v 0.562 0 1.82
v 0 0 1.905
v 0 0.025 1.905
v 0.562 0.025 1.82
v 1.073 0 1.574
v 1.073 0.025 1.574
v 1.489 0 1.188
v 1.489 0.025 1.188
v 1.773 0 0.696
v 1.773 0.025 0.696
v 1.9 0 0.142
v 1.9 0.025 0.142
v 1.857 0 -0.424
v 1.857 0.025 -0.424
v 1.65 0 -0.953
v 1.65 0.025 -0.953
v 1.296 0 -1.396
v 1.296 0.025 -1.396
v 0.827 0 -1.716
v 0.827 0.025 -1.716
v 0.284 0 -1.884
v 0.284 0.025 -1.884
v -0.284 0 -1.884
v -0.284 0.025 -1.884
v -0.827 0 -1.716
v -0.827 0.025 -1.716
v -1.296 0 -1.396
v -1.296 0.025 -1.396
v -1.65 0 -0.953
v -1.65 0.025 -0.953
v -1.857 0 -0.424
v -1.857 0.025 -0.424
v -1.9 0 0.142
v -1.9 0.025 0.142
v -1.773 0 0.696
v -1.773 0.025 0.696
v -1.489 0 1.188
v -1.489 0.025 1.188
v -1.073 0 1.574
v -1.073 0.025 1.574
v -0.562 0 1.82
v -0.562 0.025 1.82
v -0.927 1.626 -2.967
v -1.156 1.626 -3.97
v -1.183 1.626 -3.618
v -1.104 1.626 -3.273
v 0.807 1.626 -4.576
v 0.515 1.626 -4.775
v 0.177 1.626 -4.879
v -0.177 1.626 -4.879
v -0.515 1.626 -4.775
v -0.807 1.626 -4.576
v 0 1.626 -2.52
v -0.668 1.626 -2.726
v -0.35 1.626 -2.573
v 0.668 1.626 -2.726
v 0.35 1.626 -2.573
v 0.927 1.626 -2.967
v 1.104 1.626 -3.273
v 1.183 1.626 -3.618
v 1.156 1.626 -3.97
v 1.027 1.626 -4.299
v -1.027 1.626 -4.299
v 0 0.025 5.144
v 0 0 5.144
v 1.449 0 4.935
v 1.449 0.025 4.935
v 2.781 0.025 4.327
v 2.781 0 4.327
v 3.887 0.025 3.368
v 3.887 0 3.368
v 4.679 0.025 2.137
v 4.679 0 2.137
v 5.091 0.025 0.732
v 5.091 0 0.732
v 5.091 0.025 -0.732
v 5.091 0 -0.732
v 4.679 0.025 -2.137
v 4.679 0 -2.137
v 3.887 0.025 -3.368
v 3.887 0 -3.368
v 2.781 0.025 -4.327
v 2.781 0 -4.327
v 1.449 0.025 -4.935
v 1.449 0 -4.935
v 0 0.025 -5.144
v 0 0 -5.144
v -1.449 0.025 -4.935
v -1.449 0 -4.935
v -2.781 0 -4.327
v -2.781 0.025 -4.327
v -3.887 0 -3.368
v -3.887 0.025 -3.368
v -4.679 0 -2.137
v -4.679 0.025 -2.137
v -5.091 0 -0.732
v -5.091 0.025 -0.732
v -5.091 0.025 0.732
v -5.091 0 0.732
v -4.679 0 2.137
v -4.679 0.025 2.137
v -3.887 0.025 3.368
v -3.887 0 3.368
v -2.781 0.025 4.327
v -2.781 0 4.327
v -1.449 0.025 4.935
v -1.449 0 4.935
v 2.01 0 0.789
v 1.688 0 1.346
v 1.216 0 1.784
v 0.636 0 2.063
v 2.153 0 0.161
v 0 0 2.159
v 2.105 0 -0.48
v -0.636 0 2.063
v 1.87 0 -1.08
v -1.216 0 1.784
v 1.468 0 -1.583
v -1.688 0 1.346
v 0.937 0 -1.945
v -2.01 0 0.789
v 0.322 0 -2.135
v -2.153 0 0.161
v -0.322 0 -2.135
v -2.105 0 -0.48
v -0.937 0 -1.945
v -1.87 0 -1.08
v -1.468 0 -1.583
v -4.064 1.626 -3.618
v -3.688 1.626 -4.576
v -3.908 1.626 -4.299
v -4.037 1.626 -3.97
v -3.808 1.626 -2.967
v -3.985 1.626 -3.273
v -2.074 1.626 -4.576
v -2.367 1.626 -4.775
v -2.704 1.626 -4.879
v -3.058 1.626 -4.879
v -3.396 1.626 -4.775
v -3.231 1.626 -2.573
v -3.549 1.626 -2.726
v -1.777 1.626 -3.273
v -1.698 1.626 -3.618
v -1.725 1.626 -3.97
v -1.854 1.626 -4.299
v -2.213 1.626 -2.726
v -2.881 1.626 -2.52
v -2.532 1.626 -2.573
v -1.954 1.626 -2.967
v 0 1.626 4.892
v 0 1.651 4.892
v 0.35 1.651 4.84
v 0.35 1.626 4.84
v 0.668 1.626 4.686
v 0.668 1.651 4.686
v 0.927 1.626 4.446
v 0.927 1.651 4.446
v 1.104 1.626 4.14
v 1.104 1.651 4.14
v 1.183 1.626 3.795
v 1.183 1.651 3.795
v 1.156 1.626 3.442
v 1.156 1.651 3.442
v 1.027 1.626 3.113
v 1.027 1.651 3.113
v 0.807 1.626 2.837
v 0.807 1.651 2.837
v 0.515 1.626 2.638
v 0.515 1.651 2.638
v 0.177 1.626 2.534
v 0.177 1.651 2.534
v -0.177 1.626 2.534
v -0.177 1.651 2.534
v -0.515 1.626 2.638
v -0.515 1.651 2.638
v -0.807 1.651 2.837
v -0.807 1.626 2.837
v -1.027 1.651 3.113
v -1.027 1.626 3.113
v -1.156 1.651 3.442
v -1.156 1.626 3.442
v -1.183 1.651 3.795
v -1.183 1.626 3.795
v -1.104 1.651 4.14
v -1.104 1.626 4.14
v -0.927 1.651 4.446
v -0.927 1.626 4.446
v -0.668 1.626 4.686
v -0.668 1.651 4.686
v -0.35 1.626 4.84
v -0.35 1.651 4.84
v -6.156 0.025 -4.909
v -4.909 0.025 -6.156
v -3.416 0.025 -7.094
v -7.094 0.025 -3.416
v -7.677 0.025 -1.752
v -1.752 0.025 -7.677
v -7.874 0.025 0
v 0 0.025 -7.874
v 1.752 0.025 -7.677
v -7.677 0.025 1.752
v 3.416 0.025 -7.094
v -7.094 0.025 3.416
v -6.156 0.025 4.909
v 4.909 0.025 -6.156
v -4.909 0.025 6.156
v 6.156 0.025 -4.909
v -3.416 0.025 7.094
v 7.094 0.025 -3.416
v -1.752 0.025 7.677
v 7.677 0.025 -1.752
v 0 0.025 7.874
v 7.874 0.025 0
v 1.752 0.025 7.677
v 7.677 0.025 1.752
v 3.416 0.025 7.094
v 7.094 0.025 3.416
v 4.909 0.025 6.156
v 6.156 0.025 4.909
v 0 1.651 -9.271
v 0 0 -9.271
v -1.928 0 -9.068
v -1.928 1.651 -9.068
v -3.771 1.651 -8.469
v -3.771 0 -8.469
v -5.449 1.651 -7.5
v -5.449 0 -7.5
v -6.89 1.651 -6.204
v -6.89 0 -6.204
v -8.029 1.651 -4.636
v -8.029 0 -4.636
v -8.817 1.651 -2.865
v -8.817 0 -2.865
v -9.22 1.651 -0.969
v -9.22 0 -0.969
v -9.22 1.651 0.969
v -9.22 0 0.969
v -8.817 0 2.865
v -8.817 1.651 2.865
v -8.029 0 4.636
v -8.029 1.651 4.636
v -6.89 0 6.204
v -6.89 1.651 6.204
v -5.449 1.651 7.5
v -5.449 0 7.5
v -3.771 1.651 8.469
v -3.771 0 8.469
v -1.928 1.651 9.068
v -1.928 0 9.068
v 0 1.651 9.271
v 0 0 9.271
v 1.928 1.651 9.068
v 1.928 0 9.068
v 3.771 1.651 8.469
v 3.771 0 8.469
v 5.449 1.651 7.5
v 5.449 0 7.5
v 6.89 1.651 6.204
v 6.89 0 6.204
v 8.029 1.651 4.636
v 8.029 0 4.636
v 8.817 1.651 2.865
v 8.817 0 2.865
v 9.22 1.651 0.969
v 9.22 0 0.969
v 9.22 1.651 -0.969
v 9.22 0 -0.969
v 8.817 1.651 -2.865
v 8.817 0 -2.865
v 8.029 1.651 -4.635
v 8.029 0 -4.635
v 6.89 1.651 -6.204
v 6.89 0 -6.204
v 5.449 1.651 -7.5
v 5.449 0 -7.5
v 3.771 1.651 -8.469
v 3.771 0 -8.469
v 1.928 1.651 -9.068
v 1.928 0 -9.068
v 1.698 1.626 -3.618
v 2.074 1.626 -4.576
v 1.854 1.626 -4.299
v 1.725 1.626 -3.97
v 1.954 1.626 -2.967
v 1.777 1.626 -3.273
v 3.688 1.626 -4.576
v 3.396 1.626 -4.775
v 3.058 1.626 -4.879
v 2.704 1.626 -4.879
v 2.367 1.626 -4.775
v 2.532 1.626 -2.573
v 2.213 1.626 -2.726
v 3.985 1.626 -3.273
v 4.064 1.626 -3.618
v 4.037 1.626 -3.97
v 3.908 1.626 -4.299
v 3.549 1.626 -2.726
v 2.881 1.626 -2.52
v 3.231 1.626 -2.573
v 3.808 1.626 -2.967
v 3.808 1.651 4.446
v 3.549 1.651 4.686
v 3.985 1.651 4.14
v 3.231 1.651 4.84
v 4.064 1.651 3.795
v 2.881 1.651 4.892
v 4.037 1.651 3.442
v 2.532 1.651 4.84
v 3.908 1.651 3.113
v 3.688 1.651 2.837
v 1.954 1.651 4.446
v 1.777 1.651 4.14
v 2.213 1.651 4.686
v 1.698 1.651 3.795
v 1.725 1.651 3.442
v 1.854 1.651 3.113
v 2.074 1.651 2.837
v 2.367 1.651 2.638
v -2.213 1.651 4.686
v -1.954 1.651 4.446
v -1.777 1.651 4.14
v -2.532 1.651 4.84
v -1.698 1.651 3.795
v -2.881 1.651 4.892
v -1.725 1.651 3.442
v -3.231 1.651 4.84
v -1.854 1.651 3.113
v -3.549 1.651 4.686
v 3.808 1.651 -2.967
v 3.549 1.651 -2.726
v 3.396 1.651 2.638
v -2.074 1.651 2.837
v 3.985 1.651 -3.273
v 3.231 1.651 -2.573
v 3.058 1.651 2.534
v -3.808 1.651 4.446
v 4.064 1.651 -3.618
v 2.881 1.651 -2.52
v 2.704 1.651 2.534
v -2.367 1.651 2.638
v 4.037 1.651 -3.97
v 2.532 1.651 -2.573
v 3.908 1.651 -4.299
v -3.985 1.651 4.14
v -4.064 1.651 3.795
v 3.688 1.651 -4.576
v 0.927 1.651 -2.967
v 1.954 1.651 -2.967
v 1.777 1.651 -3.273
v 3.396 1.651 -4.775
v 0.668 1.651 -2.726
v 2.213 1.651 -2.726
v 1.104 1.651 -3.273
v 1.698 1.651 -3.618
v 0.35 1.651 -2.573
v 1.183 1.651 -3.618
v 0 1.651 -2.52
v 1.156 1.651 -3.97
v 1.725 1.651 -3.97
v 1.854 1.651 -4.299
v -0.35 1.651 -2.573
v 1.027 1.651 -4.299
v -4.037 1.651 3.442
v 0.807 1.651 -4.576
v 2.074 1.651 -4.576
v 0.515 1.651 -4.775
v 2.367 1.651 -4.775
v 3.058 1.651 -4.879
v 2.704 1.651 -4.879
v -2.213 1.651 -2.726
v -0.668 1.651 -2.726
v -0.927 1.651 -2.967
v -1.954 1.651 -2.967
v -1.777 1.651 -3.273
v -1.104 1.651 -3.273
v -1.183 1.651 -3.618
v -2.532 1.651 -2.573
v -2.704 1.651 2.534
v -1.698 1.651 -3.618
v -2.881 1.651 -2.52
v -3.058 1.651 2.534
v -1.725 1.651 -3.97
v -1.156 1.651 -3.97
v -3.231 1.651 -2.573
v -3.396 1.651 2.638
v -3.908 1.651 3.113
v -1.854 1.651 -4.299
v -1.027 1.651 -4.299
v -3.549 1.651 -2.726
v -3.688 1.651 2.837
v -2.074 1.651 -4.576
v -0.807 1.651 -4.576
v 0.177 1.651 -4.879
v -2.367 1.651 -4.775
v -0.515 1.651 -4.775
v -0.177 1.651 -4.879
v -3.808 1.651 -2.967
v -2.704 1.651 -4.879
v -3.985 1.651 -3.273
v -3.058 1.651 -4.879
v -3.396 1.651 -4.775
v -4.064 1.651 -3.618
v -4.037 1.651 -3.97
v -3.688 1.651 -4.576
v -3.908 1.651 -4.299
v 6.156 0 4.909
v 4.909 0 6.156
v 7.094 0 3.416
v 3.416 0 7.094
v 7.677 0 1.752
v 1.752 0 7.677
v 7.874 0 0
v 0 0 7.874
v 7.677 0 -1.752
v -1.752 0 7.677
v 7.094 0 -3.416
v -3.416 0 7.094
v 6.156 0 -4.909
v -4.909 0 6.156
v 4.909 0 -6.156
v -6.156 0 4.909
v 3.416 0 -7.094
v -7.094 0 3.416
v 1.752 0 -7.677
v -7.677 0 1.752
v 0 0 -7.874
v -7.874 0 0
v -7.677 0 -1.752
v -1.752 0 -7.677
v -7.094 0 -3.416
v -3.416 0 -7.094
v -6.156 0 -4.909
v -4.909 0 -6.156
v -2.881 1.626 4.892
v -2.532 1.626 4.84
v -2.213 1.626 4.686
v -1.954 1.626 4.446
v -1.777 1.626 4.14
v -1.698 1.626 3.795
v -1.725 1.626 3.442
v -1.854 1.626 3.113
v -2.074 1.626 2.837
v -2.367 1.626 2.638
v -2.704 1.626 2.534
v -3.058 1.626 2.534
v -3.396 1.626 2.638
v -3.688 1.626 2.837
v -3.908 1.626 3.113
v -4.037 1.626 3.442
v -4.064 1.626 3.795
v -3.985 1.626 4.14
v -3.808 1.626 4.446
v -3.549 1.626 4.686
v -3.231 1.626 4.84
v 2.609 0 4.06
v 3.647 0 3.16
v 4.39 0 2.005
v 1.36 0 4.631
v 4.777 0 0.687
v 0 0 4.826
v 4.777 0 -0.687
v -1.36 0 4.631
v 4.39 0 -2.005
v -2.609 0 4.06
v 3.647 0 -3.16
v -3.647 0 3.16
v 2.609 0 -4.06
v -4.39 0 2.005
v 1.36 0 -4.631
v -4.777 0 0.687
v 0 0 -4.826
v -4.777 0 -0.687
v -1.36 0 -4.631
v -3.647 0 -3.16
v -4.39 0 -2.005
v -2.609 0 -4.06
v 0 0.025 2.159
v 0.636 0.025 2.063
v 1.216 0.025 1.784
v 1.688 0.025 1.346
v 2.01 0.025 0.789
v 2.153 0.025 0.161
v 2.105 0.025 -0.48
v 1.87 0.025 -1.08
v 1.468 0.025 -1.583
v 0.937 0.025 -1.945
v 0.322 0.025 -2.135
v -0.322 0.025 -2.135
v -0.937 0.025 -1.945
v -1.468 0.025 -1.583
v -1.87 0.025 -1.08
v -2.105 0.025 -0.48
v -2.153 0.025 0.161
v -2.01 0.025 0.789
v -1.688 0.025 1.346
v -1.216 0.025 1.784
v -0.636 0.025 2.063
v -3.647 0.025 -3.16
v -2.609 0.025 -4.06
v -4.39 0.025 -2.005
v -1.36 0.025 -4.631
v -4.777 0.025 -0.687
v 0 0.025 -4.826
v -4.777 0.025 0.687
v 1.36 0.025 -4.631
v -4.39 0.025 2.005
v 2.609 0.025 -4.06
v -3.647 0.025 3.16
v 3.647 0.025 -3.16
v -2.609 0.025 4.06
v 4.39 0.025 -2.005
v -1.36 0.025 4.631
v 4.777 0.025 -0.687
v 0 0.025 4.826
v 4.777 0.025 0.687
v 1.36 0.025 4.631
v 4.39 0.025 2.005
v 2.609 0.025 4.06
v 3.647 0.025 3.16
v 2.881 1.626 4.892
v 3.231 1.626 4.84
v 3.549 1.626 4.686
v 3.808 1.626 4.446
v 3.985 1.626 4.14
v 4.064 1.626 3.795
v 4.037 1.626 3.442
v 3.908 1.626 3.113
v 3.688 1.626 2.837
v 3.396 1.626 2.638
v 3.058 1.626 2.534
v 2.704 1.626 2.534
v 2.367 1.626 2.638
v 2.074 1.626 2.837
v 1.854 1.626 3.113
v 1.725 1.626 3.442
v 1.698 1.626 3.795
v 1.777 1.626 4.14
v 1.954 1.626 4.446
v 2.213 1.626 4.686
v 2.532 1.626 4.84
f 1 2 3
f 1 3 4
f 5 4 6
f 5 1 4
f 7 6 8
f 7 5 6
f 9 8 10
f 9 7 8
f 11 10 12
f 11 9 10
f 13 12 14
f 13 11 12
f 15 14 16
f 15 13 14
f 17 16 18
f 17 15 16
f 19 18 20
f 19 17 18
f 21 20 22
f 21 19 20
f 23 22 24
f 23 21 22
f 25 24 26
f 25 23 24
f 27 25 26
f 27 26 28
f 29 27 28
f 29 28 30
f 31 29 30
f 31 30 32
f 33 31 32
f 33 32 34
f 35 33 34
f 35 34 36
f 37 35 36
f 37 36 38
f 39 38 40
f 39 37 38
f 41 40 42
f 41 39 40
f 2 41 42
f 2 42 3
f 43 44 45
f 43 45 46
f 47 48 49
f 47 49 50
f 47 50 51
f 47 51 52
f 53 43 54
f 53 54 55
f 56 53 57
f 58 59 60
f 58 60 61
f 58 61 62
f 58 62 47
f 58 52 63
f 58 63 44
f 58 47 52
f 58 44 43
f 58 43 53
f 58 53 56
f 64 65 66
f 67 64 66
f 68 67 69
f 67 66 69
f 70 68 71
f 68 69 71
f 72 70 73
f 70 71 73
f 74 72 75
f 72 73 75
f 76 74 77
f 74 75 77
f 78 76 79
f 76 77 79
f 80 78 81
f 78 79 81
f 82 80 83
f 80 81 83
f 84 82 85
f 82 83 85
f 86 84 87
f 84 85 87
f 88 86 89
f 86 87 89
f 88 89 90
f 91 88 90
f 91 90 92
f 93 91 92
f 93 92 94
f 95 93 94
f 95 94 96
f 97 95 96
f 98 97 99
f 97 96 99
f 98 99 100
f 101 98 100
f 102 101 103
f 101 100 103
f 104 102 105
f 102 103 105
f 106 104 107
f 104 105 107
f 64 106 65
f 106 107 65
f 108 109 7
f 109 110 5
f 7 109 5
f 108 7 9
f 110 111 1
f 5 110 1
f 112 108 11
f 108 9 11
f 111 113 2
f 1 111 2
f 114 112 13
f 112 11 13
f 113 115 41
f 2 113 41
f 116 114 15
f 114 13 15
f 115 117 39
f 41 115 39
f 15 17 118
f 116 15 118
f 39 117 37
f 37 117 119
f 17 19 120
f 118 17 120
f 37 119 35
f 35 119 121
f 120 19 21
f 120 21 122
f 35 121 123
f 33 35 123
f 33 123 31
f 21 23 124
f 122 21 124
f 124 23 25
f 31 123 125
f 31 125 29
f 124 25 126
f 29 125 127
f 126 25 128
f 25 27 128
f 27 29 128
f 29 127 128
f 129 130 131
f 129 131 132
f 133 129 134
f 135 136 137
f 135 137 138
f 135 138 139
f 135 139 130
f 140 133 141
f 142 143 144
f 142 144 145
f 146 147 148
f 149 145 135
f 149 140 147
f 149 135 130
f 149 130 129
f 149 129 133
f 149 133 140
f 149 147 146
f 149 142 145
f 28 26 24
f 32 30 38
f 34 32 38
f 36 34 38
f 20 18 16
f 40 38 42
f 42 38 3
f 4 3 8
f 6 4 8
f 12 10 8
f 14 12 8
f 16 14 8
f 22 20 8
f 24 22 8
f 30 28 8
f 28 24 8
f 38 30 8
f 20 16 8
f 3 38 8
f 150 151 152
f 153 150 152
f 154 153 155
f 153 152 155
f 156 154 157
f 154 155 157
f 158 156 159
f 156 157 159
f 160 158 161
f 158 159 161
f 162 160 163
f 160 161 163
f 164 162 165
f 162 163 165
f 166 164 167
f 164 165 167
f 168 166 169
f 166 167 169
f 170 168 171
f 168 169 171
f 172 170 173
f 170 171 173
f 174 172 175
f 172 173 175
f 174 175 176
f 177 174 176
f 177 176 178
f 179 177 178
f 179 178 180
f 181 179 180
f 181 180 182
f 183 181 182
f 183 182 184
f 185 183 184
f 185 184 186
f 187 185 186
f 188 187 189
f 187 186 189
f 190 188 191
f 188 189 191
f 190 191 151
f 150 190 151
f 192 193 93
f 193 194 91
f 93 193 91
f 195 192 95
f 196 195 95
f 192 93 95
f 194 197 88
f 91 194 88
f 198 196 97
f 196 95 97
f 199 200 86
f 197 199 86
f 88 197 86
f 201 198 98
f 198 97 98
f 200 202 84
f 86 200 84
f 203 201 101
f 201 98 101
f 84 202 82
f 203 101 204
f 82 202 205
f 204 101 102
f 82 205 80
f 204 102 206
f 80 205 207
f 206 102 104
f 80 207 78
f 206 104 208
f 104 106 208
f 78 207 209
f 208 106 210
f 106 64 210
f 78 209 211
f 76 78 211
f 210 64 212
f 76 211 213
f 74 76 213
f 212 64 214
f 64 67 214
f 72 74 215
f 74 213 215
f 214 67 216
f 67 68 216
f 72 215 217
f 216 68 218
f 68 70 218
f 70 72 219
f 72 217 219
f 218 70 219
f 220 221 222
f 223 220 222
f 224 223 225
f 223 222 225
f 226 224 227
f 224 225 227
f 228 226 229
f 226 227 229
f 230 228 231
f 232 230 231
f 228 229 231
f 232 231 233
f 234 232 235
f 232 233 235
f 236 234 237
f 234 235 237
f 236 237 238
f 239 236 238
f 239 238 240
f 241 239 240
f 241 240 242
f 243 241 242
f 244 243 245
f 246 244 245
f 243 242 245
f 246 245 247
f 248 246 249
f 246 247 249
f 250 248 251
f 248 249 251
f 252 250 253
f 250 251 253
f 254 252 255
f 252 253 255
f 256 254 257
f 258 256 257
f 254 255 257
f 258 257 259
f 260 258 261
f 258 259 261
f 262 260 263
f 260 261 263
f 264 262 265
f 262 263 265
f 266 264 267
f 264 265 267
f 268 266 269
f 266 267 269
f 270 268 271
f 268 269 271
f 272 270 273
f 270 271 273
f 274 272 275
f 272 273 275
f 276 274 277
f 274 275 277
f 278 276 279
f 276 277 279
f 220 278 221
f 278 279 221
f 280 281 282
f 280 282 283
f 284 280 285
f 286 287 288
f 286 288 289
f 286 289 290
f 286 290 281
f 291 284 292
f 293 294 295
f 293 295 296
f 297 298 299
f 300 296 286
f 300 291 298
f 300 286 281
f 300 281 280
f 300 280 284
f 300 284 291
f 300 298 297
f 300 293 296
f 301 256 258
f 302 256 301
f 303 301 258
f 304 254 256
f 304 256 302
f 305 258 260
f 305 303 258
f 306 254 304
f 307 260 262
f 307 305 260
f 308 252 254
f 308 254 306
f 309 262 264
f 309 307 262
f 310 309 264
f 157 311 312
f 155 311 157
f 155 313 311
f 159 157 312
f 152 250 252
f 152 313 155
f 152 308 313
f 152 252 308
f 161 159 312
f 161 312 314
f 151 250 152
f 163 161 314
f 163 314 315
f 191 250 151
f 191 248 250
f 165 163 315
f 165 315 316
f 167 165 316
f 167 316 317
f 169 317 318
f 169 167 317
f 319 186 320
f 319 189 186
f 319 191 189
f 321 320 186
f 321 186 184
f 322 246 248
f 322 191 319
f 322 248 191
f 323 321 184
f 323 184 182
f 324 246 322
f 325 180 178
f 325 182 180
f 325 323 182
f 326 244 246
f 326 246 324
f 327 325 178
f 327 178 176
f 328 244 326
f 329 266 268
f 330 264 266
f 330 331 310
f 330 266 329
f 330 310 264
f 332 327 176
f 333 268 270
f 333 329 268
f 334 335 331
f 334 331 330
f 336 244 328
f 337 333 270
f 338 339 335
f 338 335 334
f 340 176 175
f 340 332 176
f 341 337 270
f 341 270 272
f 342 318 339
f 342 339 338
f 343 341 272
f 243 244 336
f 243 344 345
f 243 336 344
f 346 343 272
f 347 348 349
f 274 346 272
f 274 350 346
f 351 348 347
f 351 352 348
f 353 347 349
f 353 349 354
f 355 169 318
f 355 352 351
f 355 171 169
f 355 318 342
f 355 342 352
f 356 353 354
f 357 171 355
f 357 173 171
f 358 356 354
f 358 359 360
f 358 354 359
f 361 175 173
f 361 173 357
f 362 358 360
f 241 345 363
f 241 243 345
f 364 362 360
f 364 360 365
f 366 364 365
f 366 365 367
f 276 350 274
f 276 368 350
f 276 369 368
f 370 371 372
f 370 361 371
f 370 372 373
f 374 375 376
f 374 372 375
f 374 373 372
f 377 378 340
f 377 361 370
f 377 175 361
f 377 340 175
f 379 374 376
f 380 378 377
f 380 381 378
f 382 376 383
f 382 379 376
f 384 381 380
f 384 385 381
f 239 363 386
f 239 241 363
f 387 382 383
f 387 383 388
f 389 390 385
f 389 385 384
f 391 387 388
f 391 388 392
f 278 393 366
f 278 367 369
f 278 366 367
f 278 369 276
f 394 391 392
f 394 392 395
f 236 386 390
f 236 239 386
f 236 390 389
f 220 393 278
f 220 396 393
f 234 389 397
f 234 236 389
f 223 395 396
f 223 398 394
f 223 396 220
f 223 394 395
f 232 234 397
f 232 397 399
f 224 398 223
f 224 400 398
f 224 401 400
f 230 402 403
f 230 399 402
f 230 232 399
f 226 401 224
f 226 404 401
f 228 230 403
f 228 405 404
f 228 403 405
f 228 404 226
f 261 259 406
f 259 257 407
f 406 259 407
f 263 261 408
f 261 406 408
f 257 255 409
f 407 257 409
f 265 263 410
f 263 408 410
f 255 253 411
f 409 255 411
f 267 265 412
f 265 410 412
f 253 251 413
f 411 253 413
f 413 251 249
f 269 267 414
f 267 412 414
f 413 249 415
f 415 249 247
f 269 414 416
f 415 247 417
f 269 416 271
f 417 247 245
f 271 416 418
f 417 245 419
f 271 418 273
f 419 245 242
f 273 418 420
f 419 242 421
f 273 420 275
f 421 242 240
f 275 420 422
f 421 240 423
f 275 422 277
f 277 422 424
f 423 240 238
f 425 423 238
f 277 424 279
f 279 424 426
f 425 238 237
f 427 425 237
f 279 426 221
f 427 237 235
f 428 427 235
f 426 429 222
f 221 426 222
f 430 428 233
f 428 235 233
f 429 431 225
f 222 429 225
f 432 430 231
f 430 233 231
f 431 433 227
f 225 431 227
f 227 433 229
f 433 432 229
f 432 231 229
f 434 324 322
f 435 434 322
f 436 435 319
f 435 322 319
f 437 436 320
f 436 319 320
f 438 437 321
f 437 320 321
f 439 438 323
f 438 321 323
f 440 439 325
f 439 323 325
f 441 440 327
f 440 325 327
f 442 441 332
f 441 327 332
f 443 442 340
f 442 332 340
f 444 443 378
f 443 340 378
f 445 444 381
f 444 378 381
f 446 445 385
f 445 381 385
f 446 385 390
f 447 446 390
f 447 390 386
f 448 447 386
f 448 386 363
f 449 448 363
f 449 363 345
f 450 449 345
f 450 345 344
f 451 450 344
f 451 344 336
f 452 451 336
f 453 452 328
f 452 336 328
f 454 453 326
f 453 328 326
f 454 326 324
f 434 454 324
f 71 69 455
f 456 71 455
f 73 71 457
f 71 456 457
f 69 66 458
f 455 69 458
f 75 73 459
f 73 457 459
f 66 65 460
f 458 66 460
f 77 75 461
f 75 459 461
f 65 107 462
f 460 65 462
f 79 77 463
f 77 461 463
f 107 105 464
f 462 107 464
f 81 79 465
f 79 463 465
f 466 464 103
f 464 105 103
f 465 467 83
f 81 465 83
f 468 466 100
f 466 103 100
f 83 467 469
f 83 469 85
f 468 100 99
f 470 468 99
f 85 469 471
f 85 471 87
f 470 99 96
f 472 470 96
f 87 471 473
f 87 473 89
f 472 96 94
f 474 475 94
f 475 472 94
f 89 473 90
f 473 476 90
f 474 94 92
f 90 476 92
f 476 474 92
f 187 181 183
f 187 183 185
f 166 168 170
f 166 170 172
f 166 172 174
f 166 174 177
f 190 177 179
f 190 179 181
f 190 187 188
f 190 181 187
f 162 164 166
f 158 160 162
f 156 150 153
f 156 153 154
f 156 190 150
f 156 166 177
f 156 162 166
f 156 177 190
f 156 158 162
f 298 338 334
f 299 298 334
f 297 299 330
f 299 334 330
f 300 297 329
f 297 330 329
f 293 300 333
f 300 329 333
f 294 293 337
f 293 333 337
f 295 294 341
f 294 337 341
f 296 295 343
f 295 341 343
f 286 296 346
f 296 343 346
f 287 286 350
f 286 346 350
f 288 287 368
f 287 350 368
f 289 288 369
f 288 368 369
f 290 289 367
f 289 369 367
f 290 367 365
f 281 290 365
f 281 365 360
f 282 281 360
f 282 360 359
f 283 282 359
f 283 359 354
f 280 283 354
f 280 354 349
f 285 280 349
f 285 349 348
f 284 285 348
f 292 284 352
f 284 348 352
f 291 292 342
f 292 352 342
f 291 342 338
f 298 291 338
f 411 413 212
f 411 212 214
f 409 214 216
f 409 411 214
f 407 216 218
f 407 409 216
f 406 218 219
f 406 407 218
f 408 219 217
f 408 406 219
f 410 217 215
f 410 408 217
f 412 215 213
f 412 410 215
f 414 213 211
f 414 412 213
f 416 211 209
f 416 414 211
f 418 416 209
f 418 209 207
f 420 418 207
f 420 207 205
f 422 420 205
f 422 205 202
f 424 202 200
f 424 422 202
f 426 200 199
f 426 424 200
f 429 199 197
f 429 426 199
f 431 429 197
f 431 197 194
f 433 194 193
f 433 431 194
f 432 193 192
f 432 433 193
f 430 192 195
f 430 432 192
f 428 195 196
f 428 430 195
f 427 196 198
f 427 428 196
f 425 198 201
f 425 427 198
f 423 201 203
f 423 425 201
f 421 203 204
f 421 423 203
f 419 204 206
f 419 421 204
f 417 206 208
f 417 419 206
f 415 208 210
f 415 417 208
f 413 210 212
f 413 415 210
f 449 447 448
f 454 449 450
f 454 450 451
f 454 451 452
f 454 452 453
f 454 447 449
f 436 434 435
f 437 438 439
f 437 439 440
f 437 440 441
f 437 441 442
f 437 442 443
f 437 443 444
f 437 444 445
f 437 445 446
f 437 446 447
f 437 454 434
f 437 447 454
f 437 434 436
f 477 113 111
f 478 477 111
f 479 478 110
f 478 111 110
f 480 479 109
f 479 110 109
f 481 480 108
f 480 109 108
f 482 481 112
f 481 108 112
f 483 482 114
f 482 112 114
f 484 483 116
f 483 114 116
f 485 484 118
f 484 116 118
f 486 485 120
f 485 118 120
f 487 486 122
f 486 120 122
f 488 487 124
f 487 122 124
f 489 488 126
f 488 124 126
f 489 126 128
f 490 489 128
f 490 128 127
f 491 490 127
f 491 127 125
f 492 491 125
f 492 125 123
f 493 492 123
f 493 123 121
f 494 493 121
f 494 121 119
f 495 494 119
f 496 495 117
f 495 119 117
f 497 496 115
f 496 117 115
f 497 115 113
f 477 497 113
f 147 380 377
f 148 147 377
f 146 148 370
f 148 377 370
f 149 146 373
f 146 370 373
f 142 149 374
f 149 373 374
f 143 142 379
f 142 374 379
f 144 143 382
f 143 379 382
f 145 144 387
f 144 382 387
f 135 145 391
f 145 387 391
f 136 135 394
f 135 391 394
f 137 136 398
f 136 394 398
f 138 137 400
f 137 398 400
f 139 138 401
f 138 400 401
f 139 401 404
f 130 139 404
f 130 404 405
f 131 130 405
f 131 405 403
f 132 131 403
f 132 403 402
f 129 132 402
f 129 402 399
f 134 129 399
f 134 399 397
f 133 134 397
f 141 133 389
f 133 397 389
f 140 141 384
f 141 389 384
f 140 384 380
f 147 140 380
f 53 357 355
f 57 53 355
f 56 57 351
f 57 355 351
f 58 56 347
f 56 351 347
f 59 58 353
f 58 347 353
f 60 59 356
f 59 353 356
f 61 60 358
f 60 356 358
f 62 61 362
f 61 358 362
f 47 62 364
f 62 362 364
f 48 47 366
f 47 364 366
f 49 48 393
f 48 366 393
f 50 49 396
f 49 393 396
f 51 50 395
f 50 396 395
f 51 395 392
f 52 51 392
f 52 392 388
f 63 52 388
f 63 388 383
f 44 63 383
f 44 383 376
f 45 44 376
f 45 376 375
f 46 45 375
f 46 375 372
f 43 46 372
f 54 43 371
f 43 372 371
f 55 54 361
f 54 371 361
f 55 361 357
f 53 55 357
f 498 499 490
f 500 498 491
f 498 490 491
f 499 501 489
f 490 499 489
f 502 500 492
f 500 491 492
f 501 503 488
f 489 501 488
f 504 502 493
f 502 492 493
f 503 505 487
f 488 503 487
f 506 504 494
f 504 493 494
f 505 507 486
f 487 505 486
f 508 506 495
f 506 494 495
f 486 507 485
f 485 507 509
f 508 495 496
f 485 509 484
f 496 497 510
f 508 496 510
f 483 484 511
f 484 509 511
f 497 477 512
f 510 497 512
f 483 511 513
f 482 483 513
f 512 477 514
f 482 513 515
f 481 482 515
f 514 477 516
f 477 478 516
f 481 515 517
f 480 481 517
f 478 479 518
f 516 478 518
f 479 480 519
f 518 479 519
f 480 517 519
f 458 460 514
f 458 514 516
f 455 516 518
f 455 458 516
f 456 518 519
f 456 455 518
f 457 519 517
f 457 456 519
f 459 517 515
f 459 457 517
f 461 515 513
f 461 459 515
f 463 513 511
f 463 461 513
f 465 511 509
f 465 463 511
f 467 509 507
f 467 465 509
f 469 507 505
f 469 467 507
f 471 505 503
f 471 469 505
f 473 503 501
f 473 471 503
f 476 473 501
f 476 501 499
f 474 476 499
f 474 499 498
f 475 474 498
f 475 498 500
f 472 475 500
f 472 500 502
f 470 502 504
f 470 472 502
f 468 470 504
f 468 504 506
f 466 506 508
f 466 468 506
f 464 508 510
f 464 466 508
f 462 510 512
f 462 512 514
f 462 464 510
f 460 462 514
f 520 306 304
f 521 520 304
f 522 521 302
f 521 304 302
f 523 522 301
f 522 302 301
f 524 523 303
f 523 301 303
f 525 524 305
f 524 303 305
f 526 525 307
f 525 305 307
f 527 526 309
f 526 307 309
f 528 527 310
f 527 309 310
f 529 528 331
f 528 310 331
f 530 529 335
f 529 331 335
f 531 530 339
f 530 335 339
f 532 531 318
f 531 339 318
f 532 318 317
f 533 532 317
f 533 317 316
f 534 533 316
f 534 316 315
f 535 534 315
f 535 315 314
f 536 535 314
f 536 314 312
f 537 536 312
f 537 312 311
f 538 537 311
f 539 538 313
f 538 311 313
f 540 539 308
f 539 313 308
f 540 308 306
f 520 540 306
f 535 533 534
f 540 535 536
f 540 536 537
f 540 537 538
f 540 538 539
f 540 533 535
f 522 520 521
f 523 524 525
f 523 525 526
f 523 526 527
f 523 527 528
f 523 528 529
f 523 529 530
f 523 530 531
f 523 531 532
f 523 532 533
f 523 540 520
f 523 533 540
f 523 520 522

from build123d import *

# Parameters (mm, degrees)
SKETCH2_R           = 9.271
BOSS_EXTRUDE1_DEPTH = 1.651
SKETCH2_3_R         = 7.874
SKETCH2_3_R_2       = 5.1435
SKETCH2_3_R_3       = 4.826
SKETCH2_3_R_4       = 2.159
SKETCH2_3_R_5       = 1.905
CUT_EXTRUDE1_DEPTH  = 0.0254
SKETCH3_R           = 1.186010715
CUT_EXTRUDE2_DEPTH  = 0.0254


with BuildPart() as part:
    # Sketch2 → Boss-Extrude1 (new body)
    with BuildSketch(Plane(origin=(0, 0, 0), x_dir=(1, 0, 0), z_dir=(0, 1, 0))):
        Circle(SKETCH2_R)
    extrude(amount=BOSS_EXTRUDE1_DEPTH)

    # Sketch2<3> → Cut-Extrude1 (cut)
    # profile 1 of 3: a face of its own
    with BuildSketch(Plane(origin=(0, 0, 0), x_dir=(1, 0, 0), z_dir=(0, 1, 0))):
        Circle(SKETCH2_3_R)
        Circle(SKETCH2_3_R_2, mode=Mode.SUBTRACT)
    # profile 2 of 3: a face of its own
    with BuildSketch(Plane(origin=(0, 0, 0), x_dir=(1, 0, 0), z_dir=(0, 1, 0))):
        Circle(SKETCH2_3_R_3)
        Circle(SKETCH2_3_R_4, mode=Mode.SUBTRACT)
    # profile 3 of 3: a face of its own
    with BuildSketch(Plane(origin=(0, 0, 0), x_dir=(1, 0, 0), z_dir=(0, 1, 0))):
        Circle(SKETCH2_3_R_5)
    extrude(amount=CUT_EXTRUDE1_DEPTH, mode=Mode.SUBTRACT)

    # Sketch3 → Cut-Extrude2 (cut)
    with BuildSketch(Plane(origin=(0, 1.651, 0), x_dir=(1, 0, 0), z_dir=(0, 1, 0))):
        with Locations((-2.88114027, 3.706360639)):
            Circle(SKETCH3_R)
        with Locations((0, 3.706360639)):
            Circle(SKETCH3_R)
        with Locations((2.88114027, 3.706360639)):
            Circle(SKETCH3_R)
        with Locations((0, -3.706360639)):
            Circle(SKETCH3_R)
        with Locations((2.88114027, -3.706360639)):
            Circle(SKETCH3_R)
        with Locations((-2.88114027, -3.706360639)):
            Circle(SKETCH3_R)
    extrude(amount=-CUT_EXTRUDE2_DEPTH, mode=Mode.SUBTRACT)


solid = part.part
